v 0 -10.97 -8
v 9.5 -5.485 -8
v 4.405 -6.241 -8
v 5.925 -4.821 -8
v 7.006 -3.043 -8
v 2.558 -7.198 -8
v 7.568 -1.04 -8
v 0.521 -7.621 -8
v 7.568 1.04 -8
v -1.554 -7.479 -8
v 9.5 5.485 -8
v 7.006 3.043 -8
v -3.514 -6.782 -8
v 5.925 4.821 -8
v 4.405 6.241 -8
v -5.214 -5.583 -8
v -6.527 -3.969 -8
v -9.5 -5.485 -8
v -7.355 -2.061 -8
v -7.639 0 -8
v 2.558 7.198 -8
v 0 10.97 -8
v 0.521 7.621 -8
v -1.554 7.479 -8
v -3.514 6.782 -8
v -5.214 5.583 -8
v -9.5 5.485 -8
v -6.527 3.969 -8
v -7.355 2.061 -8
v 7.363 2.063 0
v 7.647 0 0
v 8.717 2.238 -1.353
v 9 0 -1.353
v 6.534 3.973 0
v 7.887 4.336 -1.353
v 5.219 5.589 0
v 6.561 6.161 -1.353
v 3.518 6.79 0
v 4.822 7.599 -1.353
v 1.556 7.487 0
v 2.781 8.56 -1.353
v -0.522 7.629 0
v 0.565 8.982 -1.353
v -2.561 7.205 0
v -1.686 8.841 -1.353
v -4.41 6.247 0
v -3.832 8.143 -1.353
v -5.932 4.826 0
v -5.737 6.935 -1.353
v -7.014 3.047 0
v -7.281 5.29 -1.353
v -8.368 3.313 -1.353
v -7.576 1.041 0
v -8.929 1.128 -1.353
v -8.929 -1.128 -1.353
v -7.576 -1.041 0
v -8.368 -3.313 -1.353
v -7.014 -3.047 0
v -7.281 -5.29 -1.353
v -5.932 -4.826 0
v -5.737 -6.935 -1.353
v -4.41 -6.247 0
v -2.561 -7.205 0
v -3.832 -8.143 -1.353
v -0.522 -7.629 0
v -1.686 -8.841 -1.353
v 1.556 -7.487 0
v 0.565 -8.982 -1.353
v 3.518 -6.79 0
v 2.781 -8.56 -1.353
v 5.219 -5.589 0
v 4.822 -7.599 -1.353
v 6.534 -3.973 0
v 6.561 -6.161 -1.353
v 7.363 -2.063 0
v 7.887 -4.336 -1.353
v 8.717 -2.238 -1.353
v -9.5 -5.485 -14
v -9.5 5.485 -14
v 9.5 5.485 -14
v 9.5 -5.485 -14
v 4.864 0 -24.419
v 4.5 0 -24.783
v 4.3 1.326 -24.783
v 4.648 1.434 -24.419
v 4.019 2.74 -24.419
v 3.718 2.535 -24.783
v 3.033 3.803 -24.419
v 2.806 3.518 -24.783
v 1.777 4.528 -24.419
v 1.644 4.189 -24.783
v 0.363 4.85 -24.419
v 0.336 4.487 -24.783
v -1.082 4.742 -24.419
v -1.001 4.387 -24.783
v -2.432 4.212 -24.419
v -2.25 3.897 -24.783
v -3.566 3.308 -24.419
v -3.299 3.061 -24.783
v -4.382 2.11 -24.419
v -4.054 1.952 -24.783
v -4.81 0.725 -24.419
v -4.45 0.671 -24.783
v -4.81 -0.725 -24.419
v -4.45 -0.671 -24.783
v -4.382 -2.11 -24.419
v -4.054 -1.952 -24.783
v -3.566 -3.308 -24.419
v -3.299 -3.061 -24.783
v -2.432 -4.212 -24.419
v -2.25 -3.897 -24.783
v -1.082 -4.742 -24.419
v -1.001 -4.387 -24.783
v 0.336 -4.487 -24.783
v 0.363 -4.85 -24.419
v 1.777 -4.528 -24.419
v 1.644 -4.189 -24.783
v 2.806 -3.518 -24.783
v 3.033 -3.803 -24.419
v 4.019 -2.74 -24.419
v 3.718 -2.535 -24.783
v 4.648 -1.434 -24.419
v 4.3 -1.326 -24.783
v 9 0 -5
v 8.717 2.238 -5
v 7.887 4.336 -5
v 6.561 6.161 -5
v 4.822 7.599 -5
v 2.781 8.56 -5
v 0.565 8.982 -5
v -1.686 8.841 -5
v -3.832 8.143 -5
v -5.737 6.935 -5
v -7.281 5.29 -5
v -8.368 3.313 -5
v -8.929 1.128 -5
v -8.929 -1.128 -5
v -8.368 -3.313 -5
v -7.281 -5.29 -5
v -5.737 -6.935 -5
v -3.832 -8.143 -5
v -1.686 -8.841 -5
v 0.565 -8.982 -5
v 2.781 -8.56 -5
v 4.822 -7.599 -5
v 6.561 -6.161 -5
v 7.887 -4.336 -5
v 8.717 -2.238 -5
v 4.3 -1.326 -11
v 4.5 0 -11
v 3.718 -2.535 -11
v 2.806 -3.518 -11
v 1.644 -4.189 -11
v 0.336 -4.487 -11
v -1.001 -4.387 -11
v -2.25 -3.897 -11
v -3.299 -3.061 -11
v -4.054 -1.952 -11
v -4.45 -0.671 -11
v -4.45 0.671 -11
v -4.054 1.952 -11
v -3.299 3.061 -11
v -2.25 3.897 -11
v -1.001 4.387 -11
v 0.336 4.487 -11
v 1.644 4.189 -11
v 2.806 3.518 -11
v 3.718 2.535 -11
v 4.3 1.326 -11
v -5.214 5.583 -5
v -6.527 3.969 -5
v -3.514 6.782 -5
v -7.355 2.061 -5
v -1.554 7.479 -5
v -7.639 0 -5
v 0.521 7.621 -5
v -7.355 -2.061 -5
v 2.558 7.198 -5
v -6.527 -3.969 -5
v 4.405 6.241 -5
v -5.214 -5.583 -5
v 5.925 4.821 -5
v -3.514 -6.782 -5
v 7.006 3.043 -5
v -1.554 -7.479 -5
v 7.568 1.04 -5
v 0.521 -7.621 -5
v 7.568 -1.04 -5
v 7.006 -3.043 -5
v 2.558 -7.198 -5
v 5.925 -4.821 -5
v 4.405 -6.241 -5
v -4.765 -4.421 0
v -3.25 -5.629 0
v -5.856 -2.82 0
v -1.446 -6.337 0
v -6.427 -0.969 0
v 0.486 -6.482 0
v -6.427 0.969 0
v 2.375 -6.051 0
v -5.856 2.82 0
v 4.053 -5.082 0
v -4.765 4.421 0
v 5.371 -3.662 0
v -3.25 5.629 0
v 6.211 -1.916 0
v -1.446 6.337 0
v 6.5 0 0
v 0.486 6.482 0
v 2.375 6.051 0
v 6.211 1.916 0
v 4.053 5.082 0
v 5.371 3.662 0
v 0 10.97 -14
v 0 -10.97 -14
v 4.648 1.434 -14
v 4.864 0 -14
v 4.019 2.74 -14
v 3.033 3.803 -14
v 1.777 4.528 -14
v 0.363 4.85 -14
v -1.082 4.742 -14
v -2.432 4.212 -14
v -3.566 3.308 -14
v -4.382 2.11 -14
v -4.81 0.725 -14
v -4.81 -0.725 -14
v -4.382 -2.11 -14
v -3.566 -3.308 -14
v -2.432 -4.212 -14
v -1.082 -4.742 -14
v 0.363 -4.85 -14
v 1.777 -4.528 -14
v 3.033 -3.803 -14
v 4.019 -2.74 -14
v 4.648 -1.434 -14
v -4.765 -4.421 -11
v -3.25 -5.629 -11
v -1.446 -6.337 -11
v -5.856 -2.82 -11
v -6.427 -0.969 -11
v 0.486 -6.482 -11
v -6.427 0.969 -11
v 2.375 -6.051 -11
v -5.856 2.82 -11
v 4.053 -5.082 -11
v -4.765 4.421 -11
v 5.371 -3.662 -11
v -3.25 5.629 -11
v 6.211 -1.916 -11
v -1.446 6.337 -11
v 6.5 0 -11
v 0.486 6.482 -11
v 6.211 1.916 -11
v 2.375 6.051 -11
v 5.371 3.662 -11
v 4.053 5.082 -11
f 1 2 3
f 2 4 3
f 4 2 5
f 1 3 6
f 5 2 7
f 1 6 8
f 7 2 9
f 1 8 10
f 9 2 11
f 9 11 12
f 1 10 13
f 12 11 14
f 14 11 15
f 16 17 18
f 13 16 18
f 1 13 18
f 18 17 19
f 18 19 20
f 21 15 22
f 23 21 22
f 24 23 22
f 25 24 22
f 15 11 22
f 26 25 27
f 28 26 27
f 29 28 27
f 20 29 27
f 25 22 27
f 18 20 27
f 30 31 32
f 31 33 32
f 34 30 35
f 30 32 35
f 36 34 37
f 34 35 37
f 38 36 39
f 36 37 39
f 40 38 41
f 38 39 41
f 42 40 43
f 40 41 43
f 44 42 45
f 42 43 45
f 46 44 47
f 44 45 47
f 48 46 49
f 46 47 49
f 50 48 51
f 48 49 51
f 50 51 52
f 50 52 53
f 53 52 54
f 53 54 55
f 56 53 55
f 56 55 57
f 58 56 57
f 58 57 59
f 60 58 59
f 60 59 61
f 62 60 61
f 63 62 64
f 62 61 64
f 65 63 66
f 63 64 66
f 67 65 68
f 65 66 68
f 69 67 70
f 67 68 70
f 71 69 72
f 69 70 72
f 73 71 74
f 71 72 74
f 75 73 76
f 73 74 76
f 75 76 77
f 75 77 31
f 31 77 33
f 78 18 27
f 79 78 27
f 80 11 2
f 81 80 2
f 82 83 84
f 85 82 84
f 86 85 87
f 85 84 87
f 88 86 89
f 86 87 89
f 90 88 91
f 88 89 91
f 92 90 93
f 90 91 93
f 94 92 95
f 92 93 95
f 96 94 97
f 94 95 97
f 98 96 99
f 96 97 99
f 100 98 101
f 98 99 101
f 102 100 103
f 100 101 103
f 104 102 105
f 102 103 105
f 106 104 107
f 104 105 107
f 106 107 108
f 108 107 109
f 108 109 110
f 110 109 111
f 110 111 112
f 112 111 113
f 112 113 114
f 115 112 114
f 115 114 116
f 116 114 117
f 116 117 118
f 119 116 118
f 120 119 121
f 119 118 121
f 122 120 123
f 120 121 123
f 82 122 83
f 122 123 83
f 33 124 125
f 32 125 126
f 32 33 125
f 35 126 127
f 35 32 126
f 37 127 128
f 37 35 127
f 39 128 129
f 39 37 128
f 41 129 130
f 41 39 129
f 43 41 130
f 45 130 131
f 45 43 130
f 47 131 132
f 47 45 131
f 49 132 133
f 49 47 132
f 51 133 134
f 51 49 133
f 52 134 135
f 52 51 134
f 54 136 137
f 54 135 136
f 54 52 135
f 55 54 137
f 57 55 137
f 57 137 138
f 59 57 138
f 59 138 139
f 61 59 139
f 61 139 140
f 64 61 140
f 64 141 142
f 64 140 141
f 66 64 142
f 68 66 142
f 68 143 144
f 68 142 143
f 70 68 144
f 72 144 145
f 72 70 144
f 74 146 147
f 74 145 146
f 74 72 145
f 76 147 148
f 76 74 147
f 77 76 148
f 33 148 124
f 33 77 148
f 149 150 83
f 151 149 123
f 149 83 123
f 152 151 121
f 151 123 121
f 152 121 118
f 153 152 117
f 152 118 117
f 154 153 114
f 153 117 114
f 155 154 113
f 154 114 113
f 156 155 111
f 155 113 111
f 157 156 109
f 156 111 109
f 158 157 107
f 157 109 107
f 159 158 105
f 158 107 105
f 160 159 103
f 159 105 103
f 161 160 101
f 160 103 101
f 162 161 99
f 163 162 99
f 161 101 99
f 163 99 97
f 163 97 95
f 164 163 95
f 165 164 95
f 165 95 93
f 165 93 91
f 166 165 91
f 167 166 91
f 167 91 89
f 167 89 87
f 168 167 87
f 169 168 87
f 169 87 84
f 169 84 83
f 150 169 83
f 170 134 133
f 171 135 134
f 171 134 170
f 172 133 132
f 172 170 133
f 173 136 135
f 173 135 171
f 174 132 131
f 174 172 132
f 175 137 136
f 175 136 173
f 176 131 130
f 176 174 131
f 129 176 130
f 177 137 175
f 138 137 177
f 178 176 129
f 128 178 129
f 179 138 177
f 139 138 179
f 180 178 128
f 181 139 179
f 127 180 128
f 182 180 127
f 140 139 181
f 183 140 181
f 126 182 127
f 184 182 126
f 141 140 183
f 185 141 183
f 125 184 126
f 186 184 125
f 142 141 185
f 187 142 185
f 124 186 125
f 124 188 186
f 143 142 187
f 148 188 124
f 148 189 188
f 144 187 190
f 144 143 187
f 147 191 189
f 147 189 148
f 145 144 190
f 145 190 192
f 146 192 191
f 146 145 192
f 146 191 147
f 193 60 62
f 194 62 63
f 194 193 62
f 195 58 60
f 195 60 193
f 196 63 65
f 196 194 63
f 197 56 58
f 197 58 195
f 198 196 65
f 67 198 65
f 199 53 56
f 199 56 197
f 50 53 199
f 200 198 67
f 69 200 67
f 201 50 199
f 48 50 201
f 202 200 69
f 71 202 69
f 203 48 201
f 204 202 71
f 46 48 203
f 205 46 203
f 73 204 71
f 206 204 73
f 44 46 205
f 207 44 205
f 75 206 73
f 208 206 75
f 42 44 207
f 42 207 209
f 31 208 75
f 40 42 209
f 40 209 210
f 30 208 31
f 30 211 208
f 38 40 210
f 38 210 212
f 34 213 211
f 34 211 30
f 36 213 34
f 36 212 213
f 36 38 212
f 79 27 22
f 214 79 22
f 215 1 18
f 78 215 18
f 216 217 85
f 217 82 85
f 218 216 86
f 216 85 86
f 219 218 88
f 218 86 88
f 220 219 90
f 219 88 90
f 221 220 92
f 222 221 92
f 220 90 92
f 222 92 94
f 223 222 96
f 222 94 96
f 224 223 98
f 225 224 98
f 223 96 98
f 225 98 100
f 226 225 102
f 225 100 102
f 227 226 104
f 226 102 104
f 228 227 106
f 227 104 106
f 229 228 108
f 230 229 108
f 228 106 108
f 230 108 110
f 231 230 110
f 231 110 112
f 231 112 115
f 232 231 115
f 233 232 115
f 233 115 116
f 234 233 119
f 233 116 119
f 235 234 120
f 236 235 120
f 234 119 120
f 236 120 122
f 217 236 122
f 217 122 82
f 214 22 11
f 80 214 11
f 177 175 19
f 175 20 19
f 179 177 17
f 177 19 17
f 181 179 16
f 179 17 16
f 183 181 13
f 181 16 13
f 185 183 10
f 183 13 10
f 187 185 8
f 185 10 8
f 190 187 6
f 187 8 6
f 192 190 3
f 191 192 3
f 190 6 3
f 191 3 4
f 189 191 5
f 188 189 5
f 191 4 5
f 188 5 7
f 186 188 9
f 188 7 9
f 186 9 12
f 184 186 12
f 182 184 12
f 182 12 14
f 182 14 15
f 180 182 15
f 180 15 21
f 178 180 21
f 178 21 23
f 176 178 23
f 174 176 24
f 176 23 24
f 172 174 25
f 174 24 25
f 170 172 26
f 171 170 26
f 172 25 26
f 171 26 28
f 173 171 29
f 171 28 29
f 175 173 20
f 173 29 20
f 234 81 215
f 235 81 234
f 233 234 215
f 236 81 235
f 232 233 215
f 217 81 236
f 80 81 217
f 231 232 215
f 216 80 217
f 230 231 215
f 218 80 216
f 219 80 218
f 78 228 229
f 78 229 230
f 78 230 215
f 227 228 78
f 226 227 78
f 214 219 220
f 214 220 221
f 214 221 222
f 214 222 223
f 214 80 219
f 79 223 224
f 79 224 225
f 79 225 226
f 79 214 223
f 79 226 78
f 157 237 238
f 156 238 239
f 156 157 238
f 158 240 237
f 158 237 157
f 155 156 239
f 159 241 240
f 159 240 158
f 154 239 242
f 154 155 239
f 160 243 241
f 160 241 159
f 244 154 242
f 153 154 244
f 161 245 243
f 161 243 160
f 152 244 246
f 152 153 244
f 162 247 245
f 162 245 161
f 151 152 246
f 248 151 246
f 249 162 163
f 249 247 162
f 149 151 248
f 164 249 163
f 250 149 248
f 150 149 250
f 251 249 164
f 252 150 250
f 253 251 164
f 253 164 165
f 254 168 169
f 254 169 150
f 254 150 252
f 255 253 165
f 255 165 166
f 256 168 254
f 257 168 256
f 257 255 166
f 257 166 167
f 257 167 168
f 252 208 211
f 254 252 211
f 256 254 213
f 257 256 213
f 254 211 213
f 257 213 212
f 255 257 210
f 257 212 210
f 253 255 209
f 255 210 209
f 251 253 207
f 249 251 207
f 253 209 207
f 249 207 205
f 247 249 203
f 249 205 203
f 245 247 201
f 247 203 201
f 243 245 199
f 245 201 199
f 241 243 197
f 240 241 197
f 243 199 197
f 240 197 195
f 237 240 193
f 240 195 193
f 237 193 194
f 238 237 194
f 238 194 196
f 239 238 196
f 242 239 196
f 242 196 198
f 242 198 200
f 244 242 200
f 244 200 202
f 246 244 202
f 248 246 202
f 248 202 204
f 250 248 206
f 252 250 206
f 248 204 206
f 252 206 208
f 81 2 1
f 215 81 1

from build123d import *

# Parameters (mm, degrees)
SKETCH_1_R          = 9
EXTRUDE_1_DEPTH     = 8
SKETCH_3_R          = 6.5
EXTRUDE_2_DEPTH     = 8
EXTRUDE_3_DEPTH     = 6
SKETCH_5_R          = 6.5
EXTRUDE_4_DEPTH     = 11
SKETCH_8_R          = 6.5
CUT_EXTRUDE_3_DEPTH = 11
SKETCH_9_W          = 1.361349768
SKETCH_9_H          = 3
SKETCH_10_R         = 4.5
CUT_EXTRUDE_4_DEPTH = 29.906458333


# Read off the part's stored shape, not the designer's step: M18 机械螺纹 螺柱1, G1/8 直管螺纹 螺柱1
with BuildPart() as part:
    # 草图1 → 凸台-拉伸1 (new body)
    with BuildSketch(Plane.XY):
        Circle(SKETCH_1_R)
    extrude(amount=-EXTRUDE_1_DEPTH)

    # 草图3 → 凸台-拉伸2 (add)
    with BuildSketch(Plane.XY):
        Circle(SKETCH_3_R)
    extrude(amount=-EXTRUDE_2_DEPTH)

    # 草图4 → 凸台-拉伸3 (add)
    with BuildSketch(Plane(origin=(0, 0, -8), x_dir=(-1, 0, 0), z_dir=(0, 0, -1))):
        Polygon((0, 10.969655115), (-9.5, 5.484827557), (-9.5, -5.484827557), (0, -10.969655115), (9.5, -5.484827557), (9.5, 5.484827557), align=None)
    extrude(amount=EXTRUDE_3_DEPTH)

    # 草图5 → 凸台-拉伸4 (add)
    with BuildSketch(Plane(origin=(0, 0, -14), x_dir=(-1, 0, 0), z_dir=(0, 0, -1))):
        with Locations(Location((0, 0, 0), (0, 0, 180))):
            Circle(SKETCH_5_R)
    extrude(amount=EXTRUDE_4_DEPTH)

    # M18 机械螺纹 螺柱1 outline → M18 机械螺纹 螺柱1 (revolve, cut)
    with BuildSketch(Plane.XZ):
        Polygon((9, 0), (7.647, 0), (9, -1.353), align=None)
    revolve(axis=Axis((0, 0, 0), (0, 0, 1)), mode=Mode.SUBTRACT)

    # G1/8 直管螺纹 螺柱1 outline → G1/8 直管螺纹 螺柱1 (revolve, cut)
    with BuildSketch(Plane.XZ):
        Polygon((6.5, -14), (4.864, -14), (4.864, -24.419), (4.283, -25), (6.5, -25), align=None)
    revolve(axis=Axis((0, 0, 0), (0, 0, 1)), mode=Mode.SUBTRACT)

    # 草图8 → 切除-拉伸3 (cut)
    with BuildSketch(Plane.XY):
        Circle(SKETCH_8_R)
    extrude(amount=-CUT_EXTRUDE_3_DEPTH, mode=Mode.SUBTRACT)

    # 草图9 → 切除-旋转1 (revolve, cut)
    with BuildSketch(Plane(origin=(0, 0, 0), x_dir=(1, 0, 0), z_dir=(0, 1, 0)), mode=Mode.PRIVATE) as cut_revolve_1_sk:
        with Locations((8.319325116, 6.5)):
            Rectangle(SKETCH_9_W, SKETCH_9_H)
    revolve(cut_revolve_1_sk.sketch.rotate(Axis((0, 0, -7.326856085), (0, 0, 1)), 180), axis=Axis((0, 0, -7.326856085), (0, 0, 1)), mode=Mode.SUBTRACT)

    # 草图10 → 切除-拉伸4 (cut, through all)
    with BuildSketch(Plane(origin=(0, 0, -25), x_dir=(-1, 0, 0), z_dir=(0, 0, -1))):
        with Locations(Location((0, 0, 0), (0, 0, 180))):
            Circle(SKETCH_10_R)
    extrude(amount=-CUT_EXTRUDE_4_DEPTH, mode=Mode.SUBTRACT)


solid = part.part
